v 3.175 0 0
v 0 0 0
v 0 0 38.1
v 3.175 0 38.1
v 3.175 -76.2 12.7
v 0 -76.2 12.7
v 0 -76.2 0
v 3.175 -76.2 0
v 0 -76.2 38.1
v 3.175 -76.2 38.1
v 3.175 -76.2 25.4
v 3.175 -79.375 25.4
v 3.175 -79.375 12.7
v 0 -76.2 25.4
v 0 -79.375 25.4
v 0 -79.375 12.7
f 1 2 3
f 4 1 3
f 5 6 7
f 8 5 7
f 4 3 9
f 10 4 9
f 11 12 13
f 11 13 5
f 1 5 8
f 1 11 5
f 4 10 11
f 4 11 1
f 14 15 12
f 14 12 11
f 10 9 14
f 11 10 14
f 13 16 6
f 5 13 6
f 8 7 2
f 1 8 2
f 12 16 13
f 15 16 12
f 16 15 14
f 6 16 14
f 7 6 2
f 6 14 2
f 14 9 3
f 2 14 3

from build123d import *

# Parameters (mm, degrees)
F0_W     = 3.175
F0_H     = 12.7
F1_DEPTH = 3.175


with BuildPart() as f1:
    # F0 (on Right) → F1 (new body)
    with BuildSketch(Plane.YZ):
        with Locations((-77.7875, 19.05)):
            Rectangle(F0_W, F0_H)
        Polygon((0, 0), (0, 38.1), (-76.2, 38.1), (-76.2, 25.4), (-76.2, 12.7), (-76.2, 0), align=None)
    extrude(amount=F1_DEPTH)


solid = f1.part
